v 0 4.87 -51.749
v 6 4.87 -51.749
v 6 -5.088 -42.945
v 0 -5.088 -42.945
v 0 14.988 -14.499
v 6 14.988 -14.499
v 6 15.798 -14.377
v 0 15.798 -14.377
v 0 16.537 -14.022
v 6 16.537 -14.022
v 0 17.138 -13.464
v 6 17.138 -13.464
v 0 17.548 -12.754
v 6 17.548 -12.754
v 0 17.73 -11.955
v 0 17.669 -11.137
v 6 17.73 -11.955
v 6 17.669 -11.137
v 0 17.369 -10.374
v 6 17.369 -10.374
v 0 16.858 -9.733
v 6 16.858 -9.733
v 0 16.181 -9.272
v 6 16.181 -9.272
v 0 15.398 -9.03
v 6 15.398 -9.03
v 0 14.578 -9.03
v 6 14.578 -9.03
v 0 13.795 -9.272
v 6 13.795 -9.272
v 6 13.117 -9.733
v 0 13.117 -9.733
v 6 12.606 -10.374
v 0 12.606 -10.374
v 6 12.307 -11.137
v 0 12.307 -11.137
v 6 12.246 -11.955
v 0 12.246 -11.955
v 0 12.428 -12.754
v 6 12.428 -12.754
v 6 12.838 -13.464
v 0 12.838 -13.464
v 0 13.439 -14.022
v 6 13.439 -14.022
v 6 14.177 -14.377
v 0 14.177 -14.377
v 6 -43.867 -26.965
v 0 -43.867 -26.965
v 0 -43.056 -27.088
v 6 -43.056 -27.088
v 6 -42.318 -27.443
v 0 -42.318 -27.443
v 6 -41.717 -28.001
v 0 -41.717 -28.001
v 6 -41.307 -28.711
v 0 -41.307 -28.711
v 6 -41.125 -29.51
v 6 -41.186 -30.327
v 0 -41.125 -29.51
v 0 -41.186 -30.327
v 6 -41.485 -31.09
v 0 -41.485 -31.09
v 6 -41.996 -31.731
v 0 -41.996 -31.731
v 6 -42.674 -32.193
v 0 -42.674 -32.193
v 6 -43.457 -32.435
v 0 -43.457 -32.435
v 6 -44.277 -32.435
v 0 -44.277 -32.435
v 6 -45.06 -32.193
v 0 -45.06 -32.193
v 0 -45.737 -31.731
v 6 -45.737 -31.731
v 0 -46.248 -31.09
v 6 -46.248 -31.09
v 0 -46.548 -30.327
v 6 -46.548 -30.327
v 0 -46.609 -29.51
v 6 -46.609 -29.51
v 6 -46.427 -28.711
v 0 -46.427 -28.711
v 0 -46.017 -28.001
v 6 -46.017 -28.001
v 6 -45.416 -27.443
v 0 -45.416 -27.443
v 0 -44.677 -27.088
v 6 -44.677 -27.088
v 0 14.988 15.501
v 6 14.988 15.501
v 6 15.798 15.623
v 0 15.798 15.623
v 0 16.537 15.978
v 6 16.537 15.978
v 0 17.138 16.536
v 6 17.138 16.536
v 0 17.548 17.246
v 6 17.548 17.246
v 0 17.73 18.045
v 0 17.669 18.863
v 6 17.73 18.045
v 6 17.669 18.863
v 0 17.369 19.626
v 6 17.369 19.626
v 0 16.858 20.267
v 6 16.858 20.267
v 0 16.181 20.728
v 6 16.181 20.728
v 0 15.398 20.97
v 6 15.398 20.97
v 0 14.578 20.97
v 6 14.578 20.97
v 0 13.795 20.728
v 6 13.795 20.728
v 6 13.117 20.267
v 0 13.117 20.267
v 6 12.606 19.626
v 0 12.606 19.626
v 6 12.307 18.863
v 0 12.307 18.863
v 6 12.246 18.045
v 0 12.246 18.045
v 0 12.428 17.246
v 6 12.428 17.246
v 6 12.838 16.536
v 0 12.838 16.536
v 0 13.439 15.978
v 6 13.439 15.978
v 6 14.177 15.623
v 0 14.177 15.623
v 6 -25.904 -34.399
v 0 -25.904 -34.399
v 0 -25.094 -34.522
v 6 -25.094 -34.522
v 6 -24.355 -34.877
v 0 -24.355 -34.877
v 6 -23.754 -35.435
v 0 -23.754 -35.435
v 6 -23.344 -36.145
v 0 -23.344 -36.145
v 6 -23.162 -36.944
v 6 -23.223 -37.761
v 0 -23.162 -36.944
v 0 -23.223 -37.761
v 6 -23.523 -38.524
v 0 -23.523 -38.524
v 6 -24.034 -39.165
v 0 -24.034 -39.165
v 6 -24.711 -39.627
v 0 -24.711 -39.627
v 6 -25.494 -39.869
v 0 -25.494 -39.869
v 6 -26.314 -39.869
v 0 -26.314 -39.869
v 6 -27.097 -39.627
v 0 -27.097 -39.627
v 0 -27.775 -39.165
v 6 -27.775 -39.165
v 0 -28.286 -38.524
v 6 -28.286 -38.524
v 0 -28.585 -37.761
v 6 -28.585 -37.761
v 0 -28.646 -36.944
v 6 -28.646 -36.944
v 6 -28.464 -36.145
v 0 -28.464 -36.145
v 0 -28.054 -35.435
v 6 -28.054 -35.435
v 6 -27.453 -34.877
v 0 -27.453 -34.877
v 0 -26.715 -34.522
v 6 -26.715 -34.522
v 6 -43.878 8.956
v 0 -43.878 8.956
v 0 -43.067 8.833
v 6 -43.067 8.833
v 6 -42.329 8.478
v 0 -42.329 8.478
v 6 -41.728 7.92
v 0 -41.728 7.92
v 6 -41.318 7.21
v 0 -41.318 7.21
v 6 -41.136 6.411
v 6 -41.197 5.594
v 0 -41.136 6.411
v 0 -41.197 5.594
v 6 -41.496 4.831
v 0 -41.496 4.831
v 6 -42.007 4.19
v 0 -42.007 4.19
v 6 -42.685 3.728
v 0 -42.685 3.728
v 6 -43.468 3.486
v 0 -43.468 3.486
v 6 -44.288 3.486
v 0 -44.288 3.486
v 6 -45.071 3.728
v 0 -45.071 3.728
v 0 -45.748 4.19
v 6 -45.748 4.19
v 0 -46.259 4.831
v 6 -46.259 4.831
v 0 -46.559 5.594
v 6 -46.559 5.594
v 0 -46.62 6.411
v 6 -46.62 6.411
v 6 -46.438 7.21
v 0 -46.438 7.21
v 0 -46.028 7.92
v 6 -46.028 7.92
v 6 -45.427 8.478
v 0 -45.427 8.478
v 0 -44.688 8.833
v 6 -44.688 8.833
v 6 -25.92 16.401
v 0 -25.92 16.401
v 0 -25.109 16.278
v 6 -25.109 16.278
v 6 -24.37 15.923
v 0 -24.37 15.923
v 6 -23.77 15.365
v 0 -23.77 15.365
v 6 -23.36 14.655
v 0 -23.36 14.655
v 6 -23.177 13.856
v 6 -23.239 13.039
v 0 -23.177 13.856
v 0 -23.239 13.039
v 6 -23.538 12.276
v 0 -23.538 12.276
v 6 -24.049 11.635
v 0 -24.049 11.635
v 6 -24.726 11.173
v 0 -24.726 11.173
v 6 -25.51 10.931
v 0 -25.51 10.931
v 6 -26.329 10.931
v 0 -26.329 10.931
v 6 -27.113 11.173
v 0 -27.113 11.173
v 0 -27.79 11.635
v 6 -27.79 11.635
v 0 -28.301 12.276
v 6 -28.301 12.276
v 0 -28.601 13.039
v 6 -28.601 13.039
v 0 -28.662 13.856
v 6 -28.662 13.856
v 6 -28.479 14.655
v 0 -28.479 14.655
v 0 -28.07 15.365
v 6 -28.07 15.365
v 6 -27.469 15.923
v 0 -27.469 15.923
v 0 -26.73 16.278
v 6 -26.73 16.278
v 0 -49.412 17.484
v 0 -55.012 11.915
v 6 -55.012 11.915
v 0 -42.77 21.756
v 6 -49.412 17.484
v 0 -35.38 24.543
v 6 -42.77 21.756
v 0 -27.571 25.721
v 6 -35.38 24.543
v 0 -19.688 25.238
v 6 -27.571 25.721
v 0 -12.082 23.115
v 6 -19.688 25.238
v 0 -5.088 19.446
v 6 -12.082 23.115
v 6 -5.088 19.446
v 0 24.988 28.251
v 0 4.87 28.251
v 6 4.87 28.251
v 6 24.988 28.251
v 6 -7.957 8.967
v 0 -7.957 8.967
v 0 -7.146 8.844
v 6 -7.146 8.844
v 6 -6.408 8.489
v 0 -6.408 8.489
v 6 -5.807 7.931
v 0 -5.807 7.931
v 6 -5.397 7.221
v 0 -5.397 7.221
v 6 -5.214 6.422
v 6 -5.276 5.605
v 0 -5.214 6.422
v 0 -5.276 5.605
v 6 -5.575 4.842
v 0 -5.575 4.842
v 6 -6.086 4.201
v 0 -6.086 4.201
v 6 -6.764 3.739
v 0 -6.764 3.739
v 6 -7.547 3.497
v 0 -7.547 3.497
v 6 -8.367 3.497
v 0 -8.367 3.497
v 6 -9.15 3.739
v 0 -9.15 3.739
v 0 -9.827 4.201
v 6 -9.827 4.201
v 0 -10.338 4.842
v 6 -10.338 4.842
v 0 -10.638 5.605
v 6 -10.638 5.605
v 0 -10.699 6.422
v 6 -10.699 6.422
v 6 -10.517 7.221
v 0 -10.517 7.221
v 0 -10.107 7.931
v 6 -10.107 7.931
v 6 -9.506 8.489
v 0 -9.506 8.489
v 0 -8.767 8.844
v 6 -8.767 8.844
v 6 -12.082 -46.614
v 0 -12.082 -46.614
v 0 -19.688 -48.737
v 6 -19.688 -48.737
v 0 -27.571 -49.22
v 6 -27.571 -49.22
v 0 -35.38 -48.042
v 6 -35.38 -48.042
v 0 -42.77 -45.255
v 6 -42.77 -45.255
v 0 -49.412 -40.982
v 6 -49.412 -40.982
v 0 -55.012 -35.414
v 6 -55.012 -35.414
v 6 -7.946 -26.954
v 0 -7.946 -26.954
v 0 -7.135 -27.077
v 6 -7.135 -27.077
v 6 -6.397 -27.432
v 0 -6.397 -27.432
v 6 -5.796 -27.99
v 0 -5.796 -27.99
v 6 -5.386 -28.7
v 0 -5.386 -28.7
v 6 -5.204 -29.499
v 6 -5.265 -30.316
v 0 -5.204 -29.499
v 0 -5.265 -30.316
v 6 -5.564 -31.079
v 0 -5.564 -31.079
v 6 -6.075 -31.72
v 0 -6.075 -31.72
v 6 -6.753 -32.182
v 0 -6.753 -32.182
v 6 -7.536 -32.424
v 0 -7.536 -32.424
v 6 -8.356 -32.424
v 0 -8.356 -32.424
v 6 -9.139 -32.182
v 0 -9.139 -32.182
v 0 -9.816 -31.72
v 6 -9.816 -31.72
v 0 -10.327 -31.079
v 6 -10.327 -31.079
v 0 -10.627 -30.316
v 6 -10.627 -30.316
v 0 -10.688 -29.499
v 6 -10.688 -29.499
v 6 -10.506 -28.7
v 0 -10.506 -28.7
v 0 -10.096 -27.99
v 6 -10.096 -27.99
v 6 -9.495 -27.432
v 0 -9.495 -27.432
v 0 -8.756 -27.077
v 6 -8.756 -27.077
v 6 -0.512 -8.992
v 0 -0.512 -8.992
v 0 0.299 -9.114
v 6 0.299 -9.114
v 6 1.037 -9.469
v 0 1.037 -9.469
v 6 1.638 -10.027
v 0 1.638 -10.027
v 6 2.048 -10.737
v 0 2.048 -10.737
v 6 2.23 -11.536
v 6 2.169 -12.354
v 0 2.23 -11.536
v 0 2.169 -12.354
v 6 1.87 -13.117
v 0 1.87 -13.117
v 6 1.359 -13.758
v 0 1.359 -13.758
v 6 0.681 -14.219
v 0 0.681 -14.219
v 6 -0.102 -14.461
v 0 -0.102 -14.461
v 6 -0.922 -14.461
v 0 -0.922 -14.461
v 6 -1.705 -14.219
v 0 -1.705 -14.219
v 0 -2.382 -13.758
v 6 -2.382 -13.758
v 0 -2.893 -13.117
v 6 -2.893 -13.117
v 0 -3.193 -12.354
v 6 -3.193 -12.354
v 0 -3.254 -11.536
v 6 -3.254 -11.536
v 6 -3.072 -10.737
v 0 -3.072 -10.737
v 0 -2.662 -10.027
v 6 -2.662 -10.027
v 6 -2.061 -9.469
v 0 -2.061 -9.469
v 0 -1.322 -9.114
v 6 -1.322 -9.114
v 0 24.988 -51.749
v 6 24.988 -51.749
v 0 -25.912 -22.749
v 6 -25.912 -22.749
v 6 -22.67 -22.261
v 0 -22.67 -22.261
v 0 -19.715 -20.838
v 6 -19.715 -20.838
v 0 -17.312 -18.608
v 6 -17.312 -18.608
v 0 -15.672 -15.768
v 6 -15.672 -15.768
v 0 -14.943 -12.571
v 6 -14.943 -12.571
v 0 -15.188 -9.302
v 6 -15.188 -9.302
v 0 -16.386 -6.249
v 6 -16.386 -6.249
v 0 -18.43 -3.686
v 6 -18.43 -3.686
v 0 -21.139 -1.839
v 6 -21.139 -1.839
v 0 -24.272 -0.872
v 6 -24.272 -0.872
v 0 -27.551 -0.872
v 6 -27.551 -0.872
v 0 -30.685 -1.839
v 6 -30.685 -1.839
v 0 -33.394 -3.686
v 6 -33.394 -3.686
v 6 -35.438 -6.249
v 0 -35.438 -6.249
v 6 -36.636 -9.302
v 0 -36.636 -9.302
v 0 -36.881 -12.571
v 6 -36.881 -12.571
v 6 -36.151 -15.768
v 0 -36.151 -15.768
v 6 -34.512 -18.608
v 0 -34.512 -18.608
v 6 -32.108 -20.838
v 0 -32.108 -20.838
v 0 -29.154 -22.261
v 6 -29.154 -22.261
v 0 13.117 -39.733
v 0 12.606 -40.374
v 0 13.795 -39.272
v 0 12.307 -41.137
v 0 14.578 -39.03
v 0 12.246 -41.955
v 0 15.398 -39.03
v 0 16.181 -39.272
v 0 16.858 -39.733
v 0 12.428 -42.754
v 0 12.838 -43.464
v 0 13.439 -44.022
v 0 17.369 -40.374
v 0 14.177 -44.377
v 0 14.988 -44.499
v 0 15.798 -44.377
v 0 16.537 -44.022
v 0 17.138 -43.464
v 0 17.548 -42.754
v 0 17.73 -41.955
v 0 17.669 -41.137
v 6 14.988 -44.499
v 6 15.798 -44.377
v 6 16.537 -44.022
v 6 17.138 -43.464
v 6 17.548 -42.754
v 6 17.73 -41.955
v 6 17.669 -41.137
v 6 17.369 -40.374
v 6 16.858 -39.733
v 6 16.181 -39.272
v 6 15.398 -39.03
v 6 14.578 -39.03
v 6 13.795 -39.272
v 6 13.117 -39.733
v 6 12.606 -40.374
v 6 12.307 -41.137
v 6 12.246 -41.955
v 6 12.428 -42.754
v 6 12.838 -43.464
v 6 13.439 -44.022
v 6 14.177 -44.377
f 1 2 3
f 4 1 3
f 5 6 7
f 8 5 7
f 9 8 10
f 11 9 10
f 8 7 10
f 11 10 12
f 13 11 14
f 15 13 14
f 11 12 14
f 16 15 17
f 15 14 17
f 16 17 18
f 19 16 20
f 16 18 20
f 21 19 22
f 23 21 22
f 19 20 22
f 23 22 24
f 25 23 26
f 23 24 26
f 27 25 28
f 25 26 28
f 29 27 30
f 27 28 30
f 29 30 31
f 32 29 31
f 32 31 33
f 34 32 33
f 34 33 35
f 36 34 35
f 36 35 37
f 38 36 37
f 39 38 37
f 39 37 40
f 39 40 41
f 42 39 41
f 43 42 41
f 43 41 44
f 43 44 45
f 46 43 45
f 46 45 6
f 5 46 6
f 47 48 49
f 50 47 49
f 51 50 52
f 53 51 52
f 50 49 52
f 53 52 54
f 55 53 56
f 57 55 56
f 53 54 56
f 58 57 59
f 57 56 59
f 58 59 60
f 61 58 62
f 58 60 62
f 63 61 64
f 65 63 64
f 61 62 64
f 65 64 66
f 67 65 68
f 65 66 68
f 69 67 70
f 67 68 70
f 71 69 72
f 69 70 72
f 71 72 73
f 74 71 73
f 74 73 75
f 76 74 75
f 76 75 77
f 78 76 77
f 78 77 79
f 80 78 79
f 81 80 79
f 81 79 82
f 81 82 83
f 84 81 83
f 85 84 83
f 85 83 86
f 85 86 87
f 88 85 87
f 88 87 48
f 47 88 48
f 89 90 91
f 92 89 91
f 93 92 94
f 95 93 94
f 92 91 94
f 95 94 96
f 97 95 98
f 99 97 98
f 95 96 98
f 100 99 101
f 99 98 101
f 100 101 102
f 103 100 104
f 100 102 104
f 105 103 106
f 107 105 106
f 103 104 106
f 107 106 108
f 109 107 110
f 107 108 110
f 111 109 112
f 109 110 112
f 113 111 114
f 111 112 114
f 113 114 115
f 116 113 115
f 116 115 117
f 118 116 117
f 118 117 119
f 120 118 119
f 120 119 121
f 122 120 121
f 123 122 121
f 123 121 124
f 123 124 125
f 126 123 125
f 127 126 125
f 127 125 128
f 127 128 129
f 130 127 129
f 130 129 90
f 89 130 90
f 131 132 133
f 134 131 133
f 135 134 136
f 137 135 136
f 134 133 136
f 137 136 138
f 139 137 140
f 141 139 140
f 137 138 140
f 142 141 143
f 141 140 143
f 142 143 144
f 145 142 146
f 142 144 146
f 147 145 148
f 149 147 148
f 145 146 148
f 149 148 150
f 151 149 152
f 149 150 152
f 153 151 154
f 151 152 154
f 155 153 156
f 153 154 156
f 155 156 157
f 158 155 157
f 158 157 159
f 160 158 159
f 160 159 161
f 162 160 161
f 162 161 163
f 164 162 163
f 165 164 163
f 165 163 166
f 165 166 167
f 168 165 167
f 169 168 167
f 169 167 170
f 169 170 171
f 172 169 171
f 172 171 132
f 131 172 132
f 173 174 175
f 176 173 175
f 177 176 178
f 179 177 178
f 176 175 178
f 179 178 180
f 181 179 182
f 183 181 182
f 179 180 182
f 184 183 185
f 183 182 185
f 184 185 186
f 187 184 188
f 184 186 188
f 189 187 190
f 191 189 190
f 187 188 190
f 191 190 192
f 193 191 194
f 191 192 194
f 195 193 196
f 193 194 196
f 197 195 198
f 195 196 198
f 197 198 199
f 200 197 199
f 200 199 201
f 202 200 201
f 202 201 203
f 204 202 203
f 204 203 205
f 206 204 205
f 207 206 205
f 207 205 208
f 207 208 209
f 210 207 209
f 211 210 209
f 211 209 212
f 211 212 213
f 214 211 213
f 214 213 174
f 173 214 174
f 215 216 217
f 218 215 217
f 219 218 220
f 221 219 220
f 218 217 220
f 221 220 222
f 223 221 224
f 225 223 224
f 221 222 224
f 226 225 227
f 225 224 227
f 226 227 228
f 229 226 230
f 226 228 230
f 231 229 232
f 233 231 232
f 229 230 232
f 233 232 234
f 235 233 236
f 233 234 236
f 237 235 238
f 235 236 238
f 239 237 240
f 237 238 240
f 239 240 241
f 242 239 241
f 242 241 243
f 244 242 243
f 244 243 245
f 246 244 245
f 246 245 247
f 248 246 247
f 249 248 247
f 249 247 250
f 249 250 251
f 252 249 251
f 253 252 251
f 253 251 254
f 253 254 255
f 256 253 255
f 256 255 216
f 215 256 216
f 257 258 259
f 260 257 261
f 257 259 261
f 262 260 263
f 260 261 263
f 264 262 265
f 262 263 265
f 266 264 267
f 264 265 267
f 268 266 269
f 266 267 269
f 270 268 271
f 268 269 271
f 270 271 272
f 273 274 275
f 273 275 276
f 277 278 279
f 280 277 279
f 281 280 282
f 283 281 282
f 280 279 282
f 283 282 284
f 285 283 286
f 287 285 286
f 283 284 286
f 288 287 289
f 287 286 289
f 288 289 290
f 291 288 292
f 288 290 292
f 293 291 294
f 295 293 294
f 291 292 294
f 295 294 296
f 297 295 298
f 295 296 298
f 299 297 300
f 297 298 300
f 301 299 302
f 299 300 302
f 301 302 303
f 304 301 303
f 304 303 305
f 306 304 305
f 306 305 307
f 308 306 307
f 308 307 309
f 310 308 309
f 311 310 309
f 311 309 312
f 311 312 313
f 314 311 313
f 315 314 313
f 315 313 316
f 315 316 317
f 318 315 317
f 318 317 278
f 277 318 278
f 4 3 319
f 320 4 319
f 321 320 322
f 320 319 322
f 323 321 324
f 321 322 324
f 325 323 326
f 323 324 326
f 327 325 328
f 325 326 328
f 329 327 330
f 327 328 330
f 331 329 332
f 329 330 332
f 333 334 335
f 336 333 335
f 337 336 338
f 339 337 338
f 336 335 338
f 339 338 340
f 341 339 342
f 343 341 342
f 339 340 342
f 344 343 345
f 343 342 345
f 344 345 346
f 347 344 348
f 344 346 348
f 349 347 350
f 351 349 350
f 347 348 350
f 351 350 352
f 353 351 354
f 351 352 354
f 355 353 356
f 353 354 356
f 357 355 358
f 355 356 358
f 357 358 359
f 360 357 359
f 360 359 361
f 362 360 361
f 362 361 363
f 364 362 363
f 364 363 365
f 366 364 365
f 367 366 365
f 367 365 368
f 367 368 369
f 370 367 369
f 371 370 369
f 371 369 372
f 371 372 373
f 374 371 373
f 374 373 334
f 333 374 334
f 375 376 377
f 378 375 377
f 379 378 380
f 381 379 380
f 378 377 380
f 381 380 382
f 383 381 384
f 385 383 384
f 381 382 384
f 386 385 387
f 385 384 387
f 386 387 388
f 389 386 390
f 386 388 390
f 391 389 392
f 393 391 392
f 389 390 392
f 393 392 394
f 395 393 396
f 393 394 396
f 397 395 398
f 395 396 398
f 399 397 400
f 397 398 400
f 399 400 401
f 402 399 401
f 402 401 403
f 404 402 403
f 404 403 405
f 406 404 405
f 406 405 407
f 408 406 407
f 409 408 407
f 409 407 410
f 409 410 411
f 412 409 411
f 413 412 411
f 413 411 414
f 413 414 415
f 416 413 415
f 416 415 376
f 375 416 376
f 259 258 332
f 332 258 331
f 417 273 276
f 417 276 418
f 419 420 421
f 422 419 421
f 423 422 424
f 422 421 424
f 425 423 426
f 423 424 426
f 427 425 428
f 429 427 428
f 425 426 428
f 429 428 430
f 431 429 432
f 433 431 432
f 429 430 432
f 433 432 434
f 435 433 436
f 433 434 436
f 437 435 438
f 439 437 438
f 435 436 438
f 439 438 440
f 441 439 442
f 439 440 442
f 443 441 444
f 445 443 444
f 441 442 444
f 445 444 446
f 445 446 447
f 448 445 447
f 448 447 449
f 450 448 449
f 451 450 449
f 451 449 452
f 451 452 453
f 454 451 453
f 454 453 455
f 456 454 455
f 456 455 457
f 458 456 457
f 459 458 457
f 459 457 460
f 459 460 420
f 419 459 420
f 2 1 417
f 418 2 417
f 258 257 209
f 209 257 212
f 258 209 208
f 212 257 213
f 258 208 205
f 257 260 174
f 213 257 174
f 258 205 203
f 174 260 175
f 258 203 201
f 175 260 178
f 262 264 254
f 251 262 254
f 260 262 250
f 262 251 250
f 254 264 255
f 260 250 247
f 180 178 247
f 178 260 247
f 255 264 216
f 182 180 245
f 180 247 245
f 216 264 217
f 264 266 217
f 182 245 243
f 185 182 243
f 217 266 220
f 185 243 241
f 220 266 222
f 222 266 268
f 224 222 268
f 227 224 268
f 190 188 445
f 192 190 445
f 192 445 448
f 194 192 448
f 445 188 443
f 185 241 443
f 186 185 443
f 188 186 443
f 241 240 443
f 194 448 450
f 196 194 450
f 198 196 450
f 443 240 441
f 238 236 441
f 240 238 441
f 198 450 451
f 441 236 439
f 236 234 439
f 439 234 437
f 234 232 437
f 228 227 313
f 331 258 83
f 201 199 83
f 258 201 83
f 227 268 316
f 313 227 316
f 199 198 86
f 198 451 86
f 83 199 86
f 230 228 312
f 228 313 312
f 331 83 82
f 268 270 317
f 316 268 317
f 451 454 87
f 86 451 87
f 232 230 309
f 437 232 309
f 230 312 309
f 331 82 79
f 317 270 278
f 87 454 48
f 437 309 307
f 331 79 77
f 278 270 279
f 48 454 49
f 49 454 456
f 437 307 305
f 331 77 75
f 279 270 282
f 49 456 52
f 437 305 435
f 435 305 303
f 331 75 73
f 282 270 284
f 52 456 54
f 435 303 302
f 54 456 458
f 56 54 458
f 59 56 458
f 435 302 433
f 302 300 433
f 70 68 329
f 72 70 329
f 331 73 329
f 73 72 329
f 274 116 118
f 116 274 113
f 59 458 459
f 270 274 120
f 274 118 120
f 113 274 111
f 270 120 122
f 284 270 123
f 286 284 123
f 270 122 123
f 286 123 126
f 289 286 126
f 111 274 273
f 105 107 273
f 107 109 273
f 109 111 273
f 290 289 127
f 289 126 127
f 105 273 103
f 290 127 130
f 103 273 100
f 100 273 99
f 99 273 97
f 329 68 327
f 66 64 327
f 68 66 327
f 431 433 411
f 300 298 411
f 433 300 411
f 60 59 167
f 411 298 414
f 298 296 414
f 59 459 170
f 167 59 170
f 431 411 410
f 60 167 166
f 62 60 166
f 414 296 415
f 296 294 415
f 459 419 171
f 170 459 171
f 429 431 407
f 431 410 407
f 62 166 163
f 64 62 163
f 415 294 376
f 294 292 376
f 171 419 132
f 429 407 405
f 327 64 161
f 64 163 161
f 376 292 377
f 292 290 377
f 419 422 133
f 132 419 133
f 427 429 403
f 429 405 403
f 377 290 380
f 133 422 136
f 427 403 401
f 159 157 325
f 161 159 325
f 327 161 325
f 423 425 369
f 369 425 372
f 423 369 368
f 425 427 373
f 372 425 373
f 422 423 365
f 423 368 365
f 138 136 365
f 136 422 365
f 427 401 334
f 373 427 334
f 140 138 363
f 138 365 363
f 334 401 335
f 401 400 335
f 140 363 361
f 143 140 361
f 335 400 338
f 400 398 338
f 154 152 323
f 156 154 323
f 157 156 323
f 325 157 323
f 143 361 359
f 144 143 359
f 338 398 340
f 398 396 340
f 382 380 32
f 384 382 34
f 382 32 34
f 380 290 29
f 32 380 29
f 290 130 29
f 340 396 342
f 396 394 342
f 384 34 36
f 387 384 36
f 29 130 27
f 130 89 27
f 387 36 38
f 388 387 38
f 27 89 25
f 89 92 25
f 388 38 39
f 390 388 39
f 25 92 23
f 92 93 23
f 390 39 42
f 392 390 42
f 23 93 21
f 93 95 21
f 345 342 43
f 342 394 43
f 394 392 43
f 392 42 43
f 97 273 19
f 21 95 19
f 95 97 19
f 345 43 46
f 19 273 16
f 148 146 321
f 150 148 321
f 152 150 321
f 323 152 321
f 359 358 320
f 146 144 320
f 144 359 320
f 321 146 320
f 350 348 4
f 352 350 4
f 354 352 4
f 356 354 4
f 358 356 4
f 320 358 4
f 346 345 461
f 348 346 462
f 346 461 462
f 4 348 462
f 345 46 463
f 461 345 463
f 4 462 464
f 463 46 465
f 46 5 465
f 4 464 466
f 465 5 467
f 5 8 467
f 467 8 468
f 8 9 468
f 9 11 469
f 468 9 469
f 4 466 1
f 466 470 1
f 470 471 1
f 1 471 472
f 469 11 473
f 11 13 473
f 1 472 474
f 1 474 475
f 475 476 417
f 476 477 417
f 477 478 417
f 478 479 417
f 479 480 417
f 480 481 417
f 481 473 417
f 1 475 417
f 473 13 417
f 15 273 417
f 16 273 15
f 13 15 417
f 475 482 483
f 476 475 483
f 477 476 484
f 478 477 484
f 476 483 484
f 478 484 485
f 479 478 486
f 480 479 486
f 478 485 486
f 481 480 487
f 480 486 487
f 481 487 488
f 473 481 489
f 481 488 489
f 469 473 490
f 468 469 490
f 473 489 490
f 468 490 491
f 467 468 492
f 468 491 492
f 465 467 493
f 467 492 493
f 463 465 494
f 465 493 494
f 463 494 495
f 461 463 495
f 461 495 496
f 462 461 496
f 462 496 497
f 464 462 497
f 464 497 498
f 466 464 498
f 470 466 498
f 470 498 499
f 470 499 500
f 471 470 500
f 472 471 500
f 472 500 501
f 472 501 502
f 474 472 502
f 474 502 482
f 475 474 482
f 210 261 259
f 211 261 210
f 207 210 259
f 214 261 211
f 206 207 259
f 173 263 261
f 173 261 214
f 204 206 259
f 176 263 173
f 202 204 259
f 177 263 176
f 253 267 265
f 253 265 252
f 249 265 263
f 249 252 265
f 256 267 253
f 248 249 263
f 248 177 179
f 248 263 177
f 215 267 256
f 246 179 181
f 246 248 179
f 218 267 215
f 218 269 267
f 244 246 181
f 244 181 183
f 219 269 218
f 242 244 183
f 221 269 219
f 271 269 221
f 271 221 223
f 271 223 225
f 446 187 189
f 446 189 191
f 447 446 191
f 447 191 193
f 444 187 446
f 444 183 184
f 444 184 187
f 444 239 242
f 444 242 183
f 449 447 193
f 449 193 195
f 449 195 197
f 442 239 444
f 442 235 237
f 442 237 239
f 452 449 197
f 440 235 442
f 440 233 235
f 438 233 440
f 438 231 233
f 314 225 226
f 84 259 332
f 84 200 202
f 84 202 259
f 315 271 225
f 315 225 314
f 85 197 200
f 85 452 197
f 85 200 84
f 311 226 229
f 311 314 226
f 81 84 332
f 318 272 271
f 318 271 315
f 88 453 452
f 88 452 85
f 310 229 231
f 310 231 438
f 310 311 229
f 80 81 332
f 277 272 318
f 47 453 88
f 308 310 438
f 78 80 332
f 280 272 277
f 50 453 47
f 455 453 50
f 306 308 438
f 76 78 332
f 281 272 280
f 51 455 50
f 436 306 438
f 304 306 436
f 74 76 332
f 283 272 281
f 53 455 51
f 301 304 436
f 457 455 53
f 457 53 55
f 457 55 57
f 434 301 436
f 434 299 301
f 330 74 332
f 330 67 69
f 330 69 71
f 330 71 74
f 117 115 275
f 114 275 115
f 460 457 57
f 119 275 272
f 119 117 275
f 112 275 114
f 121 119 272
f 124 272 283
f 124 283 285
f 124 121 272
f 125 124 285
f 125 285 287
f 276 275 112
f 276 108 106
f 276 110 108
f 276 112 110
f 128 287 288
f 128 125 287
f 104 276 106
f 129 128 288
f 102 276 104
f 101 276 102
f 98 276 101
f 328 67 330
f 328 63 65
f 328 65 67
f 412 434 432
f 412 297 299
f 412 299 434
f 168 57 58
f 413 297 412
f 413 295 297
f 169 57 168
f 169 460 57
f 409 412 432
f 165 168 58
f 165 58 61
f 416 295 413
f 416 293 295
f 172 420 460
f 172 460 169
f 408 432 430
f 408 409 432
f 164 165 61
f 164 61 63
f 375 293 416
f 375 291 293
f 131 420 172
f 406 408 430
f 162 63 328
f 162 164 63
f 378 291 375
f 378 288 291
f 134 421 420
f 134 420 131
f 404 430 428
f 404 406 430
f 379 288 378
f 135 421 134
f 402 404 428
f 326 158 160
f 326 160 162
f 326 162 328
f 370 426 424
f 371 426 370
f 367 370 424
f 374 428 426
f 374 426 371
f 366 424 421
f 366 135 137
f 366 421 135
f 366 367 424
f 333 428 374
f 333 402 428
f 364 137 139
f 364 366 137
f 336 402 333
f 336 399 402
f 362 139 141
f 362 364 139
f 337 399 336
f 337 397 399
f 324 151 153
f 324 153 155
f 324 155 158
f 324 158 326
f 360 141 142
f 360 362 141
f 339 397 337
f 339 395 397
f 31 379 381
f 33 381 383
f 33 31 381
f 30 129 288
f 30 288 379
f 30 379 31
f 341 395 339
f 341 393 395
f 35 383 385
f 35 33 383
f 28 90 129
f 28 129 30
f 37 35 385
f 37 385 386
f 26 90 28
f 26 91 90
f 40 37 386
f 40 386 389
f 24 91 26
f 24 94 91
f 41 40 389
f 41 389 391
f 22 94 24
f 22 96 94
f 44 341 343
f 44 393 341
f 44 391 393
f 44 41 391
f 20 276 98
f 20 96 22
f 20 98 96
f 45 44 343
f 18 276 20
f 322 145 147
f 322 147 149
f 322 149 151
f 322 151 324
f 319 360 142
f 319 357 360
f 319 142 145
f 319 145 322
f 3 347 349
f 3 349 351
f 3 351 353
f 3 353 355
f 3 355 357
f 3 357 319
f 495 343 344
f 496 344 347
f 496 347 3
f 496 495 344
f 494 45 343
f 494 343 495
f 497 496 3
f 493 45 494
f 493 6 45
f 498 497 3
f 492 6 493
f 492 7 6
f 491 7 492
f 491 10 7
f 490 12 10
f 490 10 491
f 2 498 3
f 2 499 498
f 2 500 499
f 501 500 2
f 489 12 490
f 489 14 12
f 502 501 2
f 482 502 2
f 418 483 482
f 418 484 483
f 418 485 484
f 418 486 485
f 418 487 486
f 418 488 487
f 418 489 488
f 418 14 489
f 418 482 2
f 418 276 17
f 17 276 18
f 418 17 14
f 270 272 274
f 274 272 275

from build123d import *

# Parameters (mm, degrees)
SKETCH1_W           = 80
SKETCH1_H           = 80
BOSS_EXTRUDE1_DEPTH = 6
SKETCH2_R           = 11
SKETCH2_R_2         = 2.75
CUT_EXTRUDE1_DEPTH  = 7
SKETCH3_R           = 2.75
CUT_EXTRUDE2_DEPTH  = 7
CUT_EXTRUDE3_DEPTH  = 7


with BuildPart() as part:
    # Sketch1 → Boss-Extrude1 (new body)
    with BuildSketch(Plane(origin=(0, 0, 0), x_dir=(0, 0, -1), z_dir=(1, 0, 0))):
        with Locations((11.749387771, -15.012106538)):
            Rectangle(SKETCH1_W, SKETCH1_H)
    extrude(amount=BOSS_EXTRUDE1_DEPTH)

    # Sketch2 → Cut-Extrude1 (cut, through all)
    with BuildSketch(Plane(origin=(6, 0, 0), x_dir=(0, 0, -1), z_dir=(1, 0, 0))):
        with Locations((11.749387771, -25.911850923)):
            Circle(SKETCH2_R)
        with Locations((-18.250612229, 14.987893462)):
            Circle(SKETCH2_R_2)
        with Locations((41.749387771, 14.987893462)):
            Circle(SKETCH2_R_2)
        with Locations((11.749387771, 14.987893462)):
            Circle(SKETCH2_R_2)
    extrude(amount=-CUT_EXTRUDE1_DEPTH, mode=Mode.SUBTRACT)

    # Sketch3 → Cut-Extrude2 (cut, through all)
    with BuildSketch(Plane.ZY):
        with Locations((6.216594167, -7.956810044)):
            Circle(SKETCH3_R)
        with Locations((-11.741651274, -0.511852102)):
            Circle(SKETCH3_R)
        with Locations((-29.704428651, -7.945868985)):
            Circle(SKETCH3_R)
        with Locations((-37.149386593, -25.904114427)):
            Circle(SKETCH3_R)
        with Locations((-29.715369709, -43.866891803)):
            Circle(SKETCH3_R)
        with Locations((6.205653109, -43.877832862)):
            Circle(SKETCH3_R)
        with Locations((13.650611051, -25.91958742)):
            Circle(SKETCH3_R)
    extrude(amount=-CUT_EXTRUDE2_DEPTH, mode=Mode.SUBTRACT)

    # Sketch5 → Cut-Extrude3 (cut, through all)
    with BuildSketch(Plane(origin=(6, 0, 0), x_dir=(0, 0, -1), z_dir=(1, 0, 0))):
        with BuildLine():
            Line((-19.446404481, -5.087804094), (-28.250612229, 4.870195687))
            Line((-28.250612229, 4.870195687), (-37.780318954, -56.381008327))
            Line((-37.780318954, -56.381008327), (19.620213458, -79.7647401))
            Line((19.620213458, -79.7647401), (69.424766919, -54.649801307))
            Line((69.424766919, -54.649801307), (51.749387771, 4.870195687))
            Line((51.749387771, 4.870195687), (42.945180022, -5.087804094))
            ThreePointArc((42.945180022, -5.087804094), (11.749387771, -63.419428565), (-19.446404481, -5.087804094))
        make_face()
    extrude(amount=-CUT_EXTRUDE3_DEPTH, mode=Mode.SUBTRACT)


solid = part.part
